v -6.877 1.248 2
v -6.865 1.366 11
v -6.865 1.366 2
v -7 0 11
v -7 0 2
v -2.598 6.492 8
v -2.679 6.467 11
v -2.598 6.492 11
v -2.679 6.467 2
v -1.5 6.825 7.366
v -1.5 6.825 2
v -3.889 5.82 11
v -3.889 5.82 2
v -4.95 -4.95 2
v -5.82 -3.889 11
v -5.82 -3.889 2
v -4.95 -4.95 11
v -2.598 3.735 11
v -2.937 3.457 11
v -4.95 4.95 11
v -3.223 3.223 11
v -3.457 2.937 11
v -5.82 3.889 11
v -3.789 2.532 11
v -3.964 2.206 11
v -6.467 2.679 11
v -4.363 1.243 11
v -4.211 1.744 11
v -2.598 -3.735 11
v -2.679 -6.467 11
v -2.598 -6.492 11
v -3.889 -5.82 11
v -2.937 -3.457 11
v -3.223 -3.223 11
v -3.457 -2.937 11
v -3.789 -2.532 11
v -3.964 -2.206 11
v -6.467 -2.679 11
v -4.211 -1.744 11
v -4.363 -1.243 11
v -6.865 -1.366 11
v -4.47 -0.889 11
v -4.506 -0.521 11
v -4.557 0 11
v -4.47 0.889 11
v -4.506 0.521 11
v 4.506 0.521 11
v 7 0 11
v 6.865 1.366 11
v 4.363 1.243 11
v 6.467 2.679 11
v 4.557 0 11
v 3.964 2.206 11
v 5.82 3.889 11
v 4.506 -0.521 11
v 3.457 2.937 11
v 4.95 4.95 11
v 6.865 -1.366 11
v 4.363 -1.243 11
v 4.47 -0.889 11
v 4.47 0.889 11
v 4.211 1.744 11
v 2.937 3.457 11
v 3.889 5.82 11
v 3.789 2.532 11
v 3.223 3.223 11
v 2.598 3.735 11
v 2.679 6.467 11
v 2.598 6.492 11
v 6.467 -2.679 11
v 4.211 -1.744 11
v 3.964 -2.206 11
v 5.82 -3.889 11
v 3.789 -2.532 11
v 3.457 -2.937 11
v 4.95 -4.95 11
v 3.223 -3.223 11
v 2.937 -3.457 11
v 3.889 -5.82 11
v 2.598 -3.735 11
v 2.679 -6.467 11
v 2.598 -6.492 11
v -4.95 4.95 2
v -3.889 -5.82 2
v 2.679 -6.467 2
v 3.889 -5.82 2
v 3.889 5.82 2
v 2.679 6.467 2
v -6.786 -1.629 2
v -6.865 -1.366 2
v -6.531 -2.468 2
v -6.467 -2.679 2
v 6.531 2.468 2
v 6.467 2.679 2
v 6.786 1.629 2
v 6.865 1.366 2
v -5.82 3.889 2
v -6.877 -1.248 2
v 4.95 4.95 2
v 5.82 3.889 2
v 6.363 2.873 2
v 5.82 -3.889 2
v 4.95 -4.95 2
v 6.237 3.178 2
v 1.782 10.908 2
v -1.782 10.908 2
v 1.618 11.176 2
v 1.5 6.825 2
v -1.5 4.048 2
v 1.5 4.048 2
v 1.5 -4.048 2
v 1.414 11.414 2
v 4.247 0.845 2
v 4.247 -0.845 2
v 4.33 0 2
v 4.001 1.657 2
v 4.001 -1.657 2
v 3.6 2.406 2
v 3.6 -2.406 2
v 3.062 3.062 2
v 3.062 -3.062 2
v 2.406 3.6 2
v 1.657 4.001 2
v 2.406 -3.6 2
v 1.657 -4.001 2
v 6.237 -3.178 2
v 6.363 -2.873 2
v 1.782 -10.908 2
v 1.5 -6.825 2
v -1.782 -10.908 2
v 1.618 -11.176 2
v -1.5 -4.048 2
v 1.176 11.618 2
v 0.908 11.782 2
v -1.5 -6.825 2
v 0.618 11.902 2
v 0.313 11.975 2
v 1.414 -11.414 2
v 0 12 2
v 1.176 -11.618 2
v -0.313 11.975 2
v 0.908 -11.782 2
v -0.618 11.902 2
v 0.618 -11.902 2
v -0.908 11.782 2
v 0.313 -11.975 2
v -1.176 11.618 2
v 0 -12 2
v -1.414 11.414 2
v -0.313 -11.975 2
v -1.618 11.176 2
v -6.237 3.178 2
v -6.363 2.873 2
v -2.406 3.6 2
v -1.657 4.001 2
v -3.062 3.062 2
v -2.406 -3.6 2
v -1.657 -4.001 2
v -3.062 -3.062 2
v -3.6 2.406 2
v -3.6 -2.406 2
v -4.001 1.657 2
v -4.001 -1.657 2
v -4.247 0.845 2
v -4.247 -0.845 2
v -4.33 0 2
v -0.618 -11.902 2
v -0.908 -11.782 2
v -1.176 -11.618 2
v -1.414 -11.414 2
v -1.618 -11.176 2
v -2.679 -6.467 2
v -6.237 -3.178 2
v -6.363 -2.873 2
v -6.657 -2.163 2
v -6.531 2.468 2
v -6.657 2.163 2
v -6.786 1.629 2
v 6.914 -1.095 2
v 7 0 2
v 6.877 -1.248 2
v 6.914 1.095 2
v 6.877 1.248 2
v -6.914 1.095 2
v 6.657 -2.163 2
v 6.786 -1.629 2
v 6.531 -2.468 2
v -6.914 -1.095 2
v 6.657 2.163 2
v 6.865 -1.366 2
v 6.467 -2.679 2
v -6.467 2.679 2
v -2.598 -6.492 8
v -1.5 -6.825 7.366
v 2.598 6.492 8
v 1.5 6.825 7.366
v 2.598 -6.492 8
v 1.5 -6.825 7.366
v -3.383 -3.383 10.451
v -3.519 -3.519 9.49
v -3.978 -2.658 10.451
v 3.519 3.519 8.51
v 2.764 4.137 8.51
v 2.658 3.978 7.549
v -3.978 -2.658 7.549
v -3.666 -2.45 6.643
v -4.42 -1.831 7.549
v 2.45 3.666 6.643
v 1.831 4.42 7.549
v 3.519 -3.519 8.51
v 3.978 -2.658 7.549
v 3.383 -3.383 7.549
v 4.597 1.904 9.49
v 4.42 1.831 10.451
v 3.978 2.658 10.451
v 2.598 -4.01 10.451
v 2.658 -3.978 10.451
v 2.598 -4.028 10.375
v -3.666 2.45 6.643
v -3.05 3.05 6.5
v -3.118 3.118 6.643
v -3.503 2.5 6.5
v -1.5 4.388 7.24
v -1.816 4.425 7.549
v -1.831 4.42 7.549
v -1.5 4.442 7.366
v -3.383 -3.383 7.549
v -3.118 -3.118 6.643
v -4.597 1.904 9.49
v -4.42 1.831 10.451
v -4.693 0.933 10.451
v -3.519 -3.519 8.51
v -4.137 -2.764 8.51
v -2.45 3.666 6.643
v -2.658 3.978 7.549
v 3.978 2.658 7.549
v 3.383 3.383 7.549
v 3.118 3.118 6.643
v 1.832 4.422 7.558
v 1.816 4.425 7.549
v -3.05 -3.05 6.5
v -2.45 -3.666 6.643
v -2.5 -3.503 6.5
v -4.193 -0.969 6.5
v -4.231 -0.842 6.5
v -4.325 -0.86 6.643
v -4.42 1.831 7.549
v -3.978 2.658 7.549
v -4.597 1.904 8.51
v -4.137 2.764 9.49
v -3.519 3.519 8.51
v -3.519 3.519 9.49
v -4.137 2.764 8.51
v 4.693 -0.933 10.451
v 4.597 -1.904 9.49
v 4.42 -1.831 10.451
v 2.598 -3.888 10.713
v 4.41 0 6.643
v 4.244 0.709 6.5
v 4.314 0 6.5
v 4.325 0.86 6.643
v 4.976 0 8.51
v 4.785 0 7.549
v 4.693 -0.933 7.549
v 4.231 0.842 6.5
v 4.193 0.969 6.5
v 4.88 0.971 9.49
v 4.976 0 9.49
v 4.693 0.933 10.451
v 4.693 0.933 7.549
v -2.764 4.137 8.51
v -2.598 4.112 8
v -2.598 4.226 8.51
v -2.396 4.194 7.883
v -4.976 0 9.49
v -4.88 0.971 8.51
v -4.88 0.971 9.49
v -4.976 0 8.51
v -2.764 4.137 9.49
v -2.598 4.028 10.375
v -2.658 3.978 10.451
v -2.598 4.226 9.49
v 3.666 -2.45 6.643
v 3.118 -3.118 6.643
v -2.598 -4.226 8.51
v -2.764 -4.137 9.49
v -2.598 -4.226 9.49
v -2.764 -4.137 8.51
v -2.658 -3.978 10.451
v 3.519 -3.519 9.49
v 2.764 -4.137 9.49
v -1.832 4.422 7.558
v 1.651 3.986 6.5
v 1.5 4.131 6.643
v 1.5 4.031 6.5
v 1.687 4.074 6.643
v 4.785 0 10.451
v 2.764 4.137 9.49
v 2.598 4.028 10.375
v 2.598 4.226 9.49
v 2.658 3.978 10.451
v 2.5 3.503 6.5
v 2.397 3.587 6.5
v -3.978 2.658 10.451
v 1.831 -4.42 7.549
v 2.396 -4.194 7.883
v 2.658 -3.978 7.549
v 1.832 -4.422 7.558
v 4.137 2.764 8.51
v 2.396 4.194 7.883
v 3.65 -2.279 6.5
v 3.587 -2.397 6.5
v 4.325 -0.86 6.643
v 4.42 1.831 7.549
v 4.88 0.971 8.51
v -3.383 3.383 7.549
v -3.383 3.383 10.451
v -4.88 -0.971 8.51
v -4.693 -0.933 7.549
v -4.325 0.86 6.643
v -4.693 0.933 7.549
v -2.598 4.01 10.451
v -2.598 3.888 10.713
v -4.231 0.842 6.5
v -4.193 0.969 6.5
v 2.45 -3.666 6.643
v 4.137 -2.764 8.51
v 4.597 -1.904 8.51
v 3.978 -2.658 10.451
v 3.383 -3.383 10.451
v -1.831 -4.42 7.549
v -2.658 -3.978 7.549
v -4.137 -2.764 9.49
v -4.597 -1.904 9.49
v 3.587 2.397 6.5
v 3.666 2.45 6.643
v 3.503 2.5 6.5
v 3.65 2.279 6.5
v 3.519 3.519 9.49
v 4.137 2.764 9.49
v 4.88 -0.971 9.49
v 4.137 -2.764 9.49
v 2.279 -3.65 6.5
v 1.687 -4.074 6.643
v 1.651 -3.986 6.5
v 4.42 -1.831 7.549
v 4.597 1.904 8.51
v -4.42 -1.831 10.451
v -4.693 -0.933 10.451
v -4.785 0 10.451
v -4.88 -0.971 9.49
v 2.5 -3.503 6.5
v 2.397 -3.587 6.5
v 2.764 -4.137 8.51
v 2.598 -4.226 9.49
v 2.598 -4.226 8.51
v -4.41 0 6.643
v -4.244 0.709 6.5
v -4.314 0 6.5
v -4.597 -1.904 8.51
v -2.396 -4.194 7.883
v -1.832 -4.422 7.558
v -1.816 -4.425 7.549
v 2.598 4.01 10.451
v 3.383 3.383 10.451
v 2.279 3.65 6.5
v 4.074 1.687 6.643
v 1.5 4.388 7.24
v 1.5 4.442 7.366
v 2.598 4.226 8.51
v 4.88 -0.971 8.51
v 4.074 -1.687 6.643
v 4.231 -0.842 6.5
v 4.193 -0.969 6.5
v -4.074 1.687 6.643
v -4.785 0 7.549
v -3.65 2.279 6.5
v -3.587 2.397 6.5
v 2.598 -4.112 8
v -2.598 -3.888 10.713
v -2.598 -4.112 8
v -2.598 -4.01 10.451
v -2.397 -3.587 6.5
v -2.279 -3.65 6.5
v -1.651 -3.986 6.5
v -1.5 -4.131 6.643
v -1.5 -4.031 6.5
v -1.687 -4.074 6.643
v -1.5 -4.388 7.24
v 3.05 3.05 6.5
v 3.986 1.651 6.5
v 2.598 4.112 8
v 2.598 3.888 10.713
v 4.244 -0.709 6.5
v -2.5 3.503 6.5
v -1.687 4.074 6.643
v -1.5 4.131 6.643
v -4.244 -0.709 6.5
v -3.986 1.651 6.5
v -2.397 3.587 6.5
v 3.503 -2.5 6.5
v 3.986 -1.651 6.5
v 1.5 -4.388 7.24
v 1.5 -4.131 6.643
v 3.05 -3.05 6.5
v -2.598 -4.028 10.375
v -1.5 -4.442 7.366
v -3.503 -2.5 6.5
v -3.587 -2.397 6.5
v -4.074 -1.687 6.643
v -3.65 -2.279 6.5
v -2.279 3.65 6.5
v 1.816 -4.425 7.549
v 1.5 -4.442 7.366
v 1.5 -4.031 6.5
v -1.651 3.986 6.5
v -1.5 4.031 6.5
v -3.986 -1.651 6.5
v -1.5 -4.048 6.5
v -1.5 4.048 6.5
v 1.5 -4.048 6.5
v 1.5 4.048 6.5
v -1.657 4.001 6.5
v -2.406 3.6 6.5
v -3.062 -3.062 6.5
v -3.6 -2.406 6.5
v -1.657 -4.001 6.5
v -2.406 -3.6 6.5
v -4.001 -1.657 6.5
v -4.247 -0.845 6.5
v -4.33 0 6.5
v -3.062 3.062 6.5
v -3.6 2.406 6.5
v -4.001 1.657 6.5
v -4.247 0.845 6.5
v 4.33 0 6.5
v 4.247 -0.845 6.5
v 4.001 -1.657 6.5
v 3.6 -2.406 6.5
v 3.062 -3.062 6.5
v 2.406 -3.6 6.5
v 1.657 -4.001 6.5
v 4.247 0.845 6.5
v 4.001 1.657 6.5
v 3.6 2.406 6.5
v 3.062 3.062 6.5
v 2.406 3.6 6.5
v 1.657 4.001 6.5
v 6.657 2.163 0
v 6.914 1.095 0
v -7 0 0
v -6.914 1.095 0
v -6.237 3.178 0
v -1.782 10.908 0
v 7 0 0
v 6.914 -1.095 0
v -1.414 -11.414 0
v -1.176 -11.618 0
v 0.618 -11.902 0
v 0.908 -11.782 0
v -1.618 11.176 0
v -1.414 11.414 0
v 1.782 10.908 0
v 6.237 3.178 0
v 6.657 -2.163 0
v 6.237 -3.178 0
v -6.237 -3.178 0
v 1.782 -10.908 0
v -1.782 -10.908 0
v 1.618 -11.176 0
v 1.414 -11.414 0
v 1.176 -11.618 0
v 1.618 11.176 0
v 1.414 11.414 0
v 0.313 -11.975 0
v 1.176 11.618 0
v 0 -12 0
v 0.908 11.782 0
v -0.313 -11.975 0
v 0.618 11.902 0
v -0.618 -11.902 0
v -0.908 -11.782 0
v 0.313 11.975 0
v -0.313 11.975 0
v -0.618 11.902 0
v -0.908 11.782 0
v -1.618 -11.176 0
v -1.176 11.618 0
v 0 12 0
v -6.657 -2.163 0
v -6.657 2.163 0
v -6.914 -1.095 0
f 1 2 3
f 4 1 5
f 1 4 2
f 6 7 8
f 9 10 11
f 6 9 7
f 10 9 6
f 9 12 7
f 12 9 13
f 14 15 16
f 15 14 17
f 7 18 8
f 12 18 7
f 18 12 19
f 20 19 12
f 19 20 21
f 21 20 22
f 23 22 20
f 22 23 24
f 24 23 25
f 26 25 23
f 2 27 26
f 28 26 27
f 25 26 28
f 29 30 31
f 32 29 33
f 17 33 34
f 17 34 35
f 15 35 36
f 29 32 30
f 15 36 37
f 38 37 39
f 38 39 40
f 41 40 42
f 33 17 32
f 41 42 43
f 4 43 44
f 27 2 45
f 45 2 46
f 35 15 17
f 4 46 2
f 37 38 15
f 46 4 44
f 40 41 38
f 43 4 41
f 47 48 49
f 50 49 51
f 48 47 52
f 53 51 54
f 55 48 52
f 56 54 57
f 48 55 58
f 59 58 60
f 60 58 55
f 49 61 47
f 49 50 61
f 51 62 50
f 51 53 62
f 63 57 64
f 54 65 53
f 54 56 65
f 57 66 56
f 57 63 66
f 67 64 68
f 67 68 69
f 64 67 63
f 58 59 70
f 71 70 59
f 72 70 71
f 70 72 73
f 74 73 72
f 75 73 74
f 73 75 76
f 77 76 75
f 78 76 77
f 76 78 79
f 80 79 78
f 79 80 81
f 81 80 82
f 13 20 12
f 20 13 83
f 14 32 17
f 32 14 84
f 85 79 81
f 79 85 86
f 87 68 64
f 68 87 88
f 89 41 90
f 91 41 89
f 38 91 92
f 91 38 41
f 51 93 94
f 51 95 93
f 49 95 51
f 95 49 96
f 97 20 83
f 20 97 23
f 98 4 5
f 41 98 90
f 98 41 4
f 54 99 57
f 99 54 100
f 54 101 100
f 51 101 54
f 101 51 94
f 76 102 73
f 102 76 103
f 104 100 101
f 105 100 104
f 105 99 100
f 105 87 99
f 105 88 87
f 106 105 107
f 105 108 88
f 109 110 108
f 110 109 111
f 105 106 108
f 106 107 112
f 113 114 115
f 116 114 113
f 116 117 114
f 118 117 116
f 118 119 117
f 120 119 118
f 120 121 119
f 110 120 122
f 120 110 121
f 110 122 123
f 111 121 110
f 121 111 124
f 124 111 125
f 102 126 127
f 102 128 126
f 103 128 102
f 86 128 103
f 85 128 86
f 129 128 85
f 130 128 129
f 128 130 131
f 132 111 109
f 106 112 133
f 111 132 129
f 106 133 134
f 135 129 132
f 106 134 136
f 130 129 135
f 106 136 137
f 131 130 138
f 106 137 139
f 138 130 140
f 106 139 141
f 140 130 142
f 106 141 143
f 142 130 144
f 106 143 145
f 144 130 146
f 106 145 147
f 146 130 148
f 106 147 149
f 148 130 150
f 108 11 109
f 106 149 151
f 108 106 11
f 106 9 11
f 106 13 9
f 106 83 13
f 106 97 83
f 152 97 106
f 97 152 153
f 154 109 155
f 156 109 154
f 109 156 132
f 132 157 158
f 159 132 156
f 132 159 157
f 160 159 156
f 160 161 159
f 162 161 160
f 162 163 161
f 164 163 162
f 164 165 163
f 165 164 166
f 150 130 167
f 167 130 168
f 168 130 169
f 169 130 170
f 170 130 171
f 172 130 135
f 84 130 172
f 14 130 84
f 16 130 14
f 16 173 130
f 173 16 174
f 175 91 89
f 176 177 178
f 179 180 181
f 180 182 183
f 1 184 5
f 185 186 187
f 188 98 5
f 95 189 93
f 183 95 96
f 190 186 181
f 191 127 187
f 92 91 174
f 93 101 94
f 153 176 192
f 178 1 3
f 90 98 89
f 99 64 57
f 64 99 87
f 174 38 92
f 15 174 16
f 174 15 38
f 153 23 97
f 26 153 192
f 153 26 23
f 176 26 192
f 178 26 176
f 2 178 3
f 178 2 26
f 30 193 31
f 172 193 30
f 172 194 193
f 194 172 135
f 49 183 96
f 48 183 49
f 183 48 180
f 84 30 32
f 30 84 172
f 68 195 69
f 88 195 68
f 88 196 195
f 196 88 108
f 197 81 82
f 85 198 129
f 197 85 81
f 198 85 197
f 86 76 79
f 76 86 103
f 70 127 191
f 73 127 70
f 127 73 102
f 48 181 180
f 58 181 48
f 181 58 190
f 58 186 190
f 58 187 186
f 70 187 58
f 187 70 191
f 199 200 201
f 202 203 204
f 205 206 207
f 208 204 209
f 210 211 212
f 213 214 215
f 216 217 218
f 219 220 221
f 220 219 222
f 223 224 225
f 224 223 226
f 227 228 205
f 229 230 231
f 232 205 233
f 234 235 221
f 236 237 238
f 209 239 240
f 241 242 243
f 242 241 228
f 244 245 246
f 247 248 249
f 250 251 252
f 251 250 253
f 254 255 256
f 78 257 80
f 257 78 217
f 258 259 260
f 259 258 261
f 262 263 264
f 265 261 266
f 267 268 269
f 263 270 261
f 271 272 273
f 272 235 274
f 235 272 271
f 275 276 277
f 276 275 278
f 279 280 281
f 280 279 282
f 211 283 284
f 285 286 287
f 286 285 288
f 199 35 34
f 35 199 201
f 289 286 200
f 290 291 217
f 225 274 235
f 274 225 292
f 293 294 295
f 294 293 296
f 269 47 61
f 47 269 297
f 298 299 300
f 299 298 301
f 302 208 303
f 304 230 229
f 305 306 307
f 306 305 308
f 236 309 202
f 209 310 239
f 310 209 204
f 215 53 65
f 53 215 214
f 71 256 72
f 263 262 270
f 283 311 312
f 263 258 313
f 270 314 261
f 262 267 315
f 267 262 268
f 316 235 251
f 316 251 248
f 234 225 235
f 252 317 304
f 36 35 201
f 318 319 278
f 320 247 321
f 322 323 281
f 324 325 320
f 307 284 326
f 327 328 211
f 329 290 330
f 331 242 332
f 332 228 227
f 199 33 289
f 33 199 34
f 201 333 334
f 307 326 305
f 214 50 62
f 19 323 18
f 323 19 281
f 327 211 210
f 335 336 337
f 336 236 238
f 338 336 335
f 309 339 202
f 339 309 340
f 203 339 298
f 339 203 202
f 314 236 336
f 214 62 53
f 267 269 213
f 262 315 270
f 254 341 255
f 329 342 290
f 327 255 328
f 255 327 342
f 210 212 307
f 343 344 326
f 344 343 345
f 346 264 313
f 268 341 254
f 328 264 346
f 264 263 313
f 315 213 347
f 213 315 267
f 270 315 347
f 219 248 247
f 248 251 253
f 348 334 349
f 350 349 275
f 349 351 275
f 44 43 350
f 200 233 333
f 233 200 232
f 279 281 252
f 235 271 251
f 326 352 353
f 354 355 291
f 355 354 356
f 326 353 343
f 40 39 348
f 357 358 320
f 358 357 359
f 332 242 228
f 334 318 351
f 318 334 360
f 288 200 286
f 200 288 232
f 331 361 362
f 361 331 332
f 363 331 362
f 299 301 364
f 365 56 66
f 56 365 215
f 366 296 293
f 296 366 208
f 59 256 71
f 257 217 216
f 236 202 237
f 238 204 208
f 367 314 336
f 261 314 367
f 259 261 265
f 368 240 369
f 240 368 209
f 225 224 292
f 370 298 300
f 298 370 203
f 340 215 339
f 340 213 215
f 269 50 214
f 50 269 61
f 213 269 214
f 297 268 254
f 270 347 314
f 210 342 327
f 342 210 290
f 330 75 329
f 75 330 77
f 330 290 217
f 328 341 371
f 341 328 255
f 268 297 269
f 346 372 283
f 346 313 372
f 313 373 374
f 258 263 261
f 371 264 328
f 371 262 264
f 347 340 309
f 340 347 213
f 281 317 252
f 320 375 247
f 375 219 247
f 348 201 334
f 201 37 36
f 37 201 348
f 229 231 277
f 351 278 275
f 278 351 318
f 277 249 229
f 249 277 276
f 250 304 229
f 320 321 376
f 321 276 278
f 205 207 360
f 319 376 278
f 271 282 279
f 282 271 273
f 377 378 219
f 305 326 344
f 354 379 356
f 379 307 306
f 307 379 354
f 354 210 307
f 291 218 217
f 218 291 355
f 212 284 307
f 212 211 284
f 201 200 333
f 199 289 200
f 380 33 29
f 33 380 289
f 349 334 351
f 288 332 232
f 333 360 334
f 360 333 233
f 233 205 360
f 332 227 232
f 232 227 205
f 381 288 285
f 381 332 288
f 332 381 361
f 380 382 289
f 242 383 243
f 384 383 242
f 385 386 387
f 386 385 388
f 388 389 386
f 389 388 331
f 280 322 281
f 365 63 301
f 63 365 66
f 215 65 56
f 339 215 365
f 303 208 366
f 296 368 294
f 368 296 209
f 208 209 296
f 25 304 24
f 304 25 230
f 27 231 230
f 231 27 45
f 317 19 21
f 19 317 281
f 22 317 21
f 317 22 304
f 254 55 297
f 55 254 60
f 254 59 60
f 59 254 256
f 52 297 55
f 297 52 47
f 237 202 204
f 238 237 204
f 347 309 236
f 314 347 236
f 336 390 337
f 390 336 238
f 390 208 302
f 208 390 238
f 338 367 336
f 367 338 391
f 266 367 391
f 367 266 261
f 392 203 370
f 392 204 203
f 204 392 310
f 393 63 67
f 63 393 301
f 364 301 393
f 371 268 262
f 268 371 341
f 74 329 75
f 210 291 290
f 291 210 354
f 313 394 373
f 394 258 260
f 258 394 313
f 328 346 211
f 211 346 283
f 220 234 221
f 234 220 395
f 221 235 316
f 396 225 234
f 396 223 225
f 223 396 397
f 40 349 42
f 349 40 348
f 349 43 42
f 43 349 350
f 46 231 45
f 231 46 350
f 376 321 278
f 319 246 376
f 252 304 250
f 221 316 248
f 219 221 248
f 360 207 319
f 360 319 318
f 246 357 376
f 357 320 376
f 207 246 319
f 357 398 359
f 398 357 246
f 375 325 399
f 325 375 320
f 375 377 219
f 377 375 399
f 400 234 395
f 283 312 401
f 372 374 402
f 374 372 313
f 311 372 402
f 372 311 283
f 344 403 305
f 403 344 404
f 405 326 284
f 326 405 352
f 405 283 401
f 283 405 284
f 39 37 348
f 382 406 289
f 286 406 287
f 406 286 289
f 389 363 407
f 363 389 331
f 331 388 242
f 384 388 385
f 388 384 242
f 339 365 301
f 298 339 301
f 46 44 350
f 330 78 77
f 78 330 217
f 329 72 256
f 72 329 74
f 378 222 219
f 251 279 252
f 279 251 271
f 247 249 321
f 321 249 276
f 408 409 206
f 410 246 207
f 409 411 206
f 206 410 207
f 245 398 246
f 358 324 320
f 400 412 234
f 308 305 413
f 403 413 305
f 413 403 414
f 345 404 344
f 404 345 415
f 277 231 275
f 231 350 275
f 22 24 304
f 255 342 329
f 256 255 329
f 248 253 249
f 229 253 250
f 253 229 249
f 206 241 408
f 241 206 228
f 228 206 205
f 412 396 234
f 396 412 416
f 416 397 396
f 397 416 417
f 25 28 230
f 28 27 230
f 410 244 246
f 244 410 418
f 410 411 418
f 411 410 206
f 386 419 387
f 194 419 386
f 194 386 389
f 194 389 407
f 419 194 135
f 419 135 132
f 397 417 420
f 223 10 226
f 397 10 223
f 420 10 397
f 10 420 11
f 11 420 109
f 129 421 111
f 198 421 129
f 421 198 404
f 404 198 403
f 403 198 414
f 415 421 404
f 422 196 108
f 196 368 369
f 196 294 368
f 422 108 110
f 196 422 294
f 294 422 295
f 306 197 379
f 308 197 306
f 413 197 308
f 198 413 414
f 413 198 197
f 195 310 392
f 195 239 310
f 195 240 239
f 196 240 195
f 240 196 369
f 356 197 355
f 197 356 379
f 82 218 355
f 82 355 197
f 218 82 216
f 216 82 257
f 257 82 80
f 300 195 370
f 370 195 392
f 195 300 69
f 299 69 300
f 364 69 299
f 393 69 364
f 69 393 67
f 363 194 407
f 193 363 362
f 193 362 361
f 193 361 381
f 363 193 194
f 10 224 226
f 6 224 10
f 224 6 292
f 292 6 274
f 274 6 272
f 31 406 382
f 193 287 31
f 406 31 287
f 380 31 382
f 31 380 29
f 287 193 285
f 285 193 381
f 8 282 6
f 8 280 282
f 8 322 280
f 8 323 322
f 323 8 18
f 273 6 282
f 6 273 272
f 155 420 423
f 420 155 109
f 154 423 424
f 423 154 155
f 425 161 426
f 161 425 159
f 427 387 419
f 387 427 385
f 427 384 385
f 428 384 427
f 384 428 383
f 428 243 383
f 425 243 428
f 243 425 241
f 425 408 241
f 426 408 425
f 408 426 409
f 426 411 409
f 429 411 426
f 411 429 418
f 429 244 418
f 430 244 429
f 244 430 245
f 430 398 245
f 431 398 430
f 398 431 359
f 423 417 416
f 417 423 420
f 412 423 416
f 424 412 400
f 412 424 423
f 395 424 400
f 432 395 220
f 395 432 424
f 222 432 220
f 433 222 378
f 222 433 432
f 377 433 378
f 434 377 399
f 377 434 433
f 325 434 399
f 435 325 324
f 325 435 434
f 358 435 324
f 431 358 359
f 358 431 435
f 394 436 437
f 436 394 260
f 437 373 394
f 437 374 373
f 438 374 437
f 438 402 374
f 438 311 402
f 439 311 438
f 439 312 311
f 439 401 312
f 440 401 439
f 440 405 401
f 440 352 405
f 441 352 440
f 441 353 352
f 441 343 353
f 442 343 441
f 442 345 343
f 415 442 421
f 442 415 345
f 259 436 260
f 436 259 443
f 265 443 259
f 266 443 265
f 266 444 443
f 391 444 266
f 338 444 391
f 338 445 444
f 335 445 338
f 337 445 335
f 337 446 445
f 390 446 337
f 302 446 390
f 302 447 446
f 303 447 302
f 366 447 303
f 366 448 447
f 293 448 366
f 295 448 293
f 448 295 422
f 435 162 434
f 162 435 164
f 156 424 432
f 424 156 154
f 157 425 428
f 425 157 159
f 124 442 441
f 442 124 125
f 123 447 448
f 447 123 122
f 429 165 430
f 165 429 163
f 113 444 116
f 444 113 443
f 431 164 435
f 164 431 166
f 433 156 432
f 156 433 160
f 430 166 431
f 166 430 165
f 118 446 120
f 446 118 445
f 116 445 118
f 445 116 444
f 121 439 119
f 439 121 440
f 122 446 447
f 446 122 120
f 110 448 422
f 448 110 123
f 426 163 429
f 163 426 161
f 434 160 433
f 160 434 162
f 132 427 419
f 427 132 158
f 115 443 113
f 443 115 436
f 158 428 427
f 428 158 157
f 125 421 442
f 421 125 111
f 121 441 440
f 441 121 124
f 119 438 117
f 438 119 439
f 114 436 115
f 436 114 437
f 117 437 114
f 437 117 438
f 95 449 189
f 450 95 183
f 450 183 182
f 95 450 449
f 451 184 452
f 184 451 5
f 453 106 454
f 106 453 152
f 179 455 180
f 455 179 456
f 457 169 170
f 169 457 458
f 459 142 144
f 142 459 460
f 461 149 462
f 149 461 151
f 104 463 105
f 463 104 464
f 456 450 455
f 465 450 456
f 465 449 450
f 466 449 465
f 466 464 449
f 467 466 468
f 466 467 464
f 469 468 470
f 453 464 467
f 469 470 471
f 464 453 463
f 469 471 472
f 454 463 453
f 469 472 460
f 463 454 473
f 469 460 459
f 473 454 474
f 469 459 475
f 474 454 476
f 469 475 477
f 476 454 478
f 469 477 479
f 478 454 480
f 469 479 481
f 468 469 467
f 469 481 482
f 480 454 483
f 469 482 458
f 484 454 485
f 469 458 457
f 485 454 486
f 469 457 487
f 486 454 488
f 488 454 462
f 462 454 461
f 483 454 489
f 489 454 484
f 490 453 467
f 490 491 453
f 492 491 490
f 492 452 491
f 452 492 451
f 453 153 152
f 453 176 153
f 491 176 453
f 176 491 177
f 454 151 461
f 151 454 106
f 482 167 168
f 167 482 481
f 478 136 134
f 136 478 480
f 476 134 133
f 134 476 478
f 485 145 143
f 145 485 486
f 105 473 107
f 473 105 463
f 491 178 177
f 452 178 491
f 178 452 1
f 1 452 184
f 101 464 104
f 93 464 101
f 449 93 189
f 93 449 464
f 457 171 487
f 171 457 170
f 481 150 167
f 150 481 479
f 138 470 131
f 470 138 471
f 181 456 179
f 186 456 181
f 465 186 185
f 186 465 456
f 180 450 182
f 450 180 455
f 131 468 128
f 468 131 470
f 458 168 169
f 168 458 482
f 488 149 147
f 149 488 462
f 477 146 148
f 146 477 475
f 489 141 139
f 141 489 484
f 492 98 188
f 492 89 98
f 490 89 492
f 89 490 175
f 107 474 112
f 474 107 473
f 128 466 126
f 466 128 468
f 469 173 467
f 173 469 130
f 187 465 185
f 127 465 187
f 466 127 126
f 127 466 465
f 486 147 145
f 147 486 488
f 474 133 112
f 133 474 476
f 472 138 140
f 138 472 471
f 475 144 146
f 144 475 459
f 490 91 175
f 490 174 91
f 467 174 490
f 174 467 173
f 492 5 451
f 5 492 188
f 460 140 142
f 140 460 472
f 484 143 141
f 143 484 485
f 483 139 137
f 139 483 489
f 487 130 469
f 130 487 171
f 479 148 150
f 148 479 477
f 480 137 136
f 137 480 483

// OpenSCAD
// file: ball_caster_yoke.scad
include <lib.scad>;

function pvBallCasterYokeDatasheet(main_diameter, base_thickness, mount_offset, mount_diameter, mount_height=0) =
     assert(main_diameter > 0)
     assert(base_thickness > 0)
     assert(mount_offset > 0)
     assert(mount_diameter > 0)
     [["main_diameter", main_diameter], ["base_thickness", base_thickness],
      ["mount_offset", mount_offset], ["mount_diameter", mount_diameter],
      ["mount_height", mount_height]];

module pmBallCasterYoke(datasheet) {
     main_diameter = property(datasheet, "main_diameter");
     base_thickness = property(datasheet, "base_thickness");
     mount_offset = property(datasheet, "mount_offset");
     mount_diameter = property(datasheet, "mount_diameter");
     mount_height = property(datasheet, "mount_height");

     linear_extrude(height=base_thickness) {
          hull() {
               circle(d=main_diameter);
               duplicate([0, 1, 0]) {
                    translate([0, mount_offset, 0]) {
                         circle(d=mount_diameter);
                    }
               }
          }
     }
     if (mount_height > 0) {
          translate([0, 0, base_thickness]) {
               duplicate([0, 1, 0]) {
                    translate([0, mount_offset, 0]) {
                         cylinder(h=mount_height, d=mount_diameter);
                    }
               }
          }
     }
}

$fn = 40;

pmBallCasterYoke(
     datasheet=pvBallCasterYokeDatasheet(
          main_diameter=12, base_thickness=2, mount_offset=10, mount_diameter=4, mount_height=5
     )
);
// file: lib.scad
$fn = 32;

kEpsilon = 1e-1;

function property(table, key) = table[search([key], table)[0]][1];

module sector(radius, angles, fn = $fn) {
     r = radius / cos(180 / fn);
     step = -360 / fn;

     points = concat([[0, 0]],
                     [for(a = [angles[0] : step : angles[1] - 360])
                               [r * cos(a), r * sin(a)]
                          ],
                     [[r * cos(angles[1]), r * sin(angles[1])]]
          );

     difference() {
          circle(radius, $fn = fn);
          polygon(points);
     }
}

module ring(inner_radius, outer_radius, angles = [0, 360], fn = $fn) {
     difference() {
          sector(radius=outer_radius, angles=angles, fn=fn);
          sector(radius=inner_radius, angles=angles+[-kEpsilon, kEpsilon], fn=fn);
     }
}

module rounded_ring(inner_radius, outer_radius, angles = [0, 360], fn = $fn) {
     step_angle = 360 / fn;
     ring_width = outer_radius - inner_radius;
     ring_mean_radius = (outer_radius + inner_radius) / 2;
     for (theta = angles) {
          theta_d = theta / step_angle;
          theta_frac = (theta_d - floor(theta_d) - 0.5) * step_angle;
          rho = ring_mean_radius * cos(step_angle/2) / cos(theta_frac);
          rotate(theta)
          translate([rho, 0])
          circle(d=ring_width);
     }
     ring(inner_radius=inner_radius,
          outer_radius=outer_radius,
          angles=angles, fn=fn);
}

module fillet(r) {
     difference() {
          difference() {
               offset(r=-r - kEpsilon)
                    offset(delta=r) {
                    children();
               }
               offset(r=r)
                    offset(delta=-r) {
                    children();
               }
          }
          children();
     }
     offset(r=r)
          offset(delta=-r) {
          children();
     }
}

module bench_fillet(r, order=1000) {
     difference() {
          fillet(r) {
               translate([-order/2-kEpsilon, 0]) {
                    square([order, order], center=true);
               }
               children();
          }
          translate([-order/2-kEpsilon, 0]) {
               square([order+kEpsilon, order+kEpsilon], center=true);
          }
     }
}

module curved_bench_fillet(r, bench_radius, order=1000, internal=true) {
     difference() {
          fillet(r) {
               if (internal) {
                    translate([bench_radius, 0]) {
                         ring(inner_radius=bench_radius + kEpsilon, outer_radius=bench_radius * order);
                    }
               } else {
                    translate([-bench_radius, 0]) circle(r=bench_radius - kEpsilon);
               }
               children();
          }
          if (internal) {
               translate([bench_radius, 0]) {
                    ring(inner_radius=bench_radius,
                         outer_radius=bench_radius * order - kEpsilon);
               }
          } else {
               translate([-bench_radius, 0]) circle(r=bench_radius);
          }

     }
}


module window(side, position=[0, 0, 0], order=1000) {
    difference() {
        children();
        translate(position)  {
            difference() {
                square(order, center=true);
                square(side, center=true);
            }
        }
    }
}


module rounded_cylinder(diameter, height, fillet_radius, center) {
     translate([0, 0, ! center ? height/2 : 0]) {
          minkowski() {
               cylinder(d=(diameter - 2 * fillet_radius),
                        h=(height - 2 * fillet_radius),
                        center=true);
               sphere(r=fillet_radius);
          }
     }
}


module curved_support_xsection(support_radius, fillet_radius,
                               wall_inner_radius, wall_outer_radius,
                               hole_radius = 0, internal=true) {
     support_angular_width = (4 * support_radius / wall_outer_radius) * 180 / PI;
     wall_thickness = wall_outer_radius - wall_inner_radius;
     rotate([0, 0, internal ? 180 : 0]) {
          difference() {
               window(6*support_radius) {
                    curved_bench_fillet(fillet_radius, bench_radius=wall_inner_radius, internal=internal) {
                         hull() {
                              translate([support_radius + wall_thickness/2, 0]) {
                                   circle(r=support_radius);
                              }
                              rotate([0, 0, ! internal ? 180 : 0])
                              translate([wall_inner_radius + wall_thickness/2, 0]) {
                                   ring(inner_radius=wall_inner_radius,
                                        outer_radius=wall_outer_radius,
                                        angles=[180 - support_angular_width/2,
                                                180 + support_angular_width/2]);
                              }
                         }
                         rotate([0, 0, ! internal ? 180 : 0])
                         translate([wall_inner_radius + wall_thickness/2, 0]) {
                              ring(inner_radius=wall_inner_radius,
                                   outer_radius=wall_outer_radius,
                                   angles=[180 - support_angular_width,
                                           180 + support_angular_width]);
                         }
                    }
               }
               if (hole_radius > 0) {
                    translate([support_radius + wall_thickness/2, 0]) {
                         circle(r=hole_radius);
                    }
               }
          }
     }
}

module fill(upto=1000) {
     offset(delta=-upto) {
          offset(delta=upto) {
               children();
          }
     }
}

module outline(delta) {
     if (delta > 0) {
          difference() {
               offset(delta=delta) {
                    children();
               }
               children();
          }
     } else {
          difference() {
               children();
               offset(delta=delta) {
                    children();
               }
          }
     }
}

module duplicate(v) {
     children();
     mirror(v) children();
}

function steps(start, end, n) = [start:(end - start)/(n - 1):end];

function sigmoid(x) = 1.0 / (1.0 + exp(-x));

module sigmoid_profile(length, width, order=10, fn = $fn) {
     step = length / fn;
     points = concat(
          [[0, 0]],
          [for (x = [step:step:length-step]) [x, width * sigmoid(2 * order * ((x / length) - 0.5))]],
          [[length, width], [0, width]]

     );
     polygon(points=points);
}

module exp_nerve_xsection(height, length, decay_rate = 5, fn = $fn) {
     step = length / fn;
     points = concat(
          [[0, 0]],
          [for (x = [0:step:length-step]) [x, height * exp(-x/decay_rate)]],
          [[length, 0]]
          );
     polygon(points=points);
}

module exp_nerve(height, length, thickness, decay_rate = 3, fn = $fn) {
     rotate([90, 0, 0])
     linear_extrude(height=thickness, center=true) {
          exp_nerve_xsection(height, length, decay_rate, fn);
     }
}

module exp_corner_nerve(height, radius, angles, corner_radius = 0, decay_rate = 3, fn = $fn) {
     difference() {
          rotate_extrude() {
               if (corner_radius > 0) {
                    translate([corner_radius, 0, 0])
                    exp_nerve_xsection(height=height, length=radius, decay_rate=decay_rate, fn=fn);
               } else {
                    translate([-corner_radius, 0, 0])
                    mirror([1, 0, 0])
                    exp_nerve_xsection(height=height, length=radius, decay_rate=decay_rate, fn=fn);
               }
          }
          linear_extrude(height=2 * height, center=true) {
               sector(radius=radius + abs(corner_radius), angles=[angles[1], angles[0] + 360], fn=fn);
          }
     }
}
// main file
include <lib.scad>;

use <ball_caster_yoke.scad>;

function pvBallCasterSupportDatasheet(ball_diameter, ball_protrusion, ball_gap,
                                      wall_gap, wall_thickness, base_thickness,
                                      mount_offset, mount_diameter) =
     assert(ball_diameter > 0)
     assert(ball_protrusion > 0)
     assert(ball_diameter > ball_protrusion)
     assert(ball_gap > 0)
     assert(wall_gap > 0)
     assert(ball_diameter > 2 * wall_gap)
     assert(wall_thickness > 0)
     assert(base_thickness > 0)
     assert(mount_offset > ball_diameter/2)
     assert(mount_diameter > 0)
     [["ball_diameter", ball_diameter], ["ball_protrusion", ball_protrusion], ["ball_gap", ball_gap],
      ["wall_gap", wall_gap], ["wall_thickness", wall_thickness], ["base_thickness", base_thickness],
      ["mount_offset", mount_offset], ["mount_diameter", mount_diameter],
      ["ball_z_offset", base_thickness + ball_gap + ball_diameter / 2],
      ["main_height", base_thickness + ball_gap + ball_diameter - ball_protrusion],
      ["main_diameter", ball_diameter + 2 * wall_thickness]];

module pmBallCasterSupport(datasheet) {
     base_thickness = property(datasheet, "base_thickness");
     main_height = property(datasheet, "main_height");
     main_diameter = property(datasheet, "main_diameter");
     mount_offset = property(datasheet, "mount_offset");
     mount_diameter = property(datasheet, "mount_diameter");
     ball_diameter = property(datasheet, "ball_diameter");
     ball_protrusion = property(datasheet, "ball_protrusion");
     ball_gap = property(datasheet, "ball_gap");
     ball_z_offset = property(datasheet, "ball_z_offset");
     wall_gap = property(datasheet, "wall_gap");
     wall_thickness = property(datasheet, "wall_thickness");

     pmBallCasterYoke(datasheet);
     rotate([0, 0, 90]) {
          translate([0, 0, base_thickness]) {
               difference() {
                    cylinder(h=main_height - base_thickness, d=main_diameter);
                    translate([0, 0, ball_z_offset - base_thickness]) sphere(d=ball_diameter);
                    translate([-main_diameter / 2 - kEpsilon, -wall_gap / 2, 0]) {
                         cube([main_diameter + 2 * kEpsilon, wall_gap, main_height - base_thickness + kEpsilon]);
                    }
                    translate([-main_diameter/2 - kEpsilon, 0, main_height - base_thickness - wall_gap/2]) {
                         rotate([0, 90, 0]) cylinder(h=main_diameter + 2 * kEpsilon, d=2 * wall_gap, $fn=6);
                    }
                    cylinder(h=ball_diameter/4 + ball_gap, d=ball_diameter * sqrt(3)/2);
               }
          }
     }
}

pmBallCasterSupport(
     datasheet=pvBallCasterSupportDatasheet(
          ball_diameter=10, ball_protrusion=3, ball_gap=2,
          wall_gap=3, wall_thickness=2, base_thickness=2,
          mount_offset=10, mount_diameter=4
     )
);
